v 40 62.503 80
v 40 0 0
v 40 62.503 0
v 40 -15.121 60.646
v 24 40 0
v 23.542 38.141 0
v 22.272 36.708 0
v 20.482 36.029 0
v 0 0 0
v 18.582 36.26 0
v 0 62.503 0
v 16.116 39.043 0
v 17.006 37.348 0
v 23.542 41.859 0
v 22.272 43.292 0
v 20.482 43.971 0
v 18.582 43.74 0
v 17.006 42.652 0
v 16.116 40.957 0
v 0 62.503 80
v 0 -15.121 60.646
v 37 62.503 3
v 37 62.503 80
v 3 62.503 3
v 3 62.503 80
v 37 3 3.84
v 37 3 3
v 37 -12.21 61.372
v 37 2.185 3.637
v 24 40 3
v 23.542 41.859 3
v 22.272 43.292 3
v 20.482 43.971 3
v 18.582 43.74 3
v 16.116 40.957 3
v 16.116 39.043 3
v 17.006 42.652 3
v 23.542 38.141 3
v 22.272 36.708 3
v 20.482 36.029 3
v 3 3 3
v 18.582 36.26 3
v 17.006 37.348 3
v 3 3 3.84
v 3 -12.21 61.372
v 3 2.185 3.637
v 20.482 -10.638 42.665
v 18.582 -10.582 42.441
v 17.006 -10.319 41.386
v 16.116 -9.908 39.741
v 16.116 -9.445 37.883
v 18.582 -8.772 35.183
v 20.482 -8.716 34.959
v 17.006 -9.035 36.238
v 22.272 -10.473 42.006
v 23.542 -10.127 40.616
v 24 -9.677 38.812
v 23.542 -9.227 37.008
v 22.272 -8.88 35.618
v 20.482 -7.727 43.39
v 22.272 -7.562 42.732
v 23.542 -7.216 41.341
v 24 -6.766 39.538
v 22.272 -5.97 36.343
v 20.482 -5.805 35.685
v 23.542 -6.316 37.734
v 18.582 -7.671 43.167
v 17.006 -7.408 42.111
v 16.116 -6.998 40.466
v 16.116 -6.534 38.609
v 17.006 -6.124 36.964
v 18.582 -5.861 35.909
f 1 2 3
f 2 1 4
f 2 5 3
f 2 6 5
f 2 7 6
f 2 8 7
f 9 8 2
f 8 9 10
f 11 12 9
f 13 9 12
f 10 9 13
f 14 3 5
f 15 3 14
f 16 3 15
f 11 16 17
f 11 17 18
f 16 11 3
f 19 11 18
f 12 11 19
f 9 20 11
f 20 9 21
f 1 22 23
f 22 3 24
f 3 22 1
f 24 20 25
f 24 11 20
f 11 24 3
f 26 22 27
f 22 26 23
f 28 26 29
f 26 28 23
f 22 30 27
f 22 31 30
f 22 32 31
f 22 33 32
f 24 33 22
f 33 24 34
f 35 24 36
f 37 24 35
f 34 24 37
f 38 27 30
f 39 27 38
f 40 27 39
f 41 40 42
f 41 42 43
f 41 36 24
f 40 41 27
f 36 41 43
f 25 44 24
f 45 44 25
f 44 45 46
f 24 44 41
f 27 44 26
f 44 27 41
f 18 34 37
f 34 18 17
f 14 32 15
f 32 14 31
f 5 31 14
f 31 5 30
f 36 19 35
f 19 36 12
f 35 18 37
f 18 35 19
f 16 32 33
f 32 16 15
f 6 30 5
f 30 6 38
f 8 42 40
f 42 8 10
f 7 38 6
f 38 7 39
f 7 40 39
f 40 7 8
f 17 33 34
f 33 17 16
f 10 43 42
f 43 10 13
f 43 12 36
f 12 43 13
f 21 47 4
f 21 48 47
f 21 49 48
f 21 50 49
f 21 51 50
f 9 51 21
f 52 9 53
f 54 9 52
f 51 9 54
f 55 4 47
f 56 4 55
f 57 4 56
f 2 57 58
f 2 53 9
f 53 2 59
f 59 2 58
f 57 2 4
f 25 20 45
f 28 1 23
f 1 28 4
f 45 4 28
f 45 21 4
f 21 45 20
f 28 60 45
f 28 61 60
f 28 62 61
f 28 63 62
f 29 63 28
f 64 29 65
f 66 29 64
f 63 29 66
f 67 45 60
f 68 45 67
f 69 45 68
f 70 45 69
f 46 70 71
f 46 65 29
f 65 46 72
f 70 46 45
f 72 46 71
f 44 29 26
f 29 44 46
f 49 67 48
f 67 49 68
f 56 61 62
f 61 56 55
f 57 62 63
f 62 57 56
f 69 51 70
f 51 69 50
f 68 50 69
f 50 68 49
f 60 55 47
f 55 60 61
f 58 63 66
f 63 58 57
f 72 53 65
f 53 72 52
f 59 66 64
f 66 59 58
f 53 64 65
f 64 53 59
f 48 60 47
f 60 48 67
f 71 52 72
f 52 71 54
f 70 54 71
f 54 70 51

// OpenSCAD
// F-Roof: A multi-function single-layer roof
// https://github.com/f-roof
// Author: Mihai Oltean; https://mihaioltean.github.io
//------------------------------------------------------------------------------------
// LAST UPDATE: 2025.04.08.0
//------------------------------------------------------------------------------------
module corner_60()
{
    difference(){
        cube([40, 60, 60]);
        translate([3, 3, 3])
            cube([34, 60, 60]);
        translate([20, 40, -1])
            cylinder(h = 5, r = 4);
        translate([20, -1, 40])
            rotate([-90, 0, 0])
                cylinder(h = 5, r = 4);
    }
}
//-------------------------------------------------------------
module corner_80()
{
    difference(){
        cube([40, 80, 80]);
        translate([3, 3, 3])
            cube([34, 80, 80]);
        translate([20, 40, -1])
            cylinder(h = 5, r = 4);
        translate([20, -1, 40])
            rotate([-90, 0, 0])
                cylinder(h = 5, r = 4);
    }
}
//-------------------------------------------------------------
module corner_80_half_angle(angle)
{
    length = 80 / tan(angle);
    difference(){
        cube([40, length, 80]);
        rotate([angle, 0, 0]) translate([-1, 0, 0]) cube([42, 110, 80]);
        translate([3, 3, 3])
            cube([34, length, 80]);
        translate([20, 40, -1])
            cylinder(h = 5, r = 4);
        translate([20, -1, 40])
            rotate([-90, 0, 0])
                cylinder(h = 5, r = 4);
    }
}
//-------------------------------------------------------------
module corner_80_angle(angle)
{
    corner_80_half_angle(52);
        rotate([-2*(90-angle), 0, 0 ])
        mirror([0,1,0])
            corner_80_half_angle(52);
}
//-------------------------------------------------------------
corner_80_angle(52);
//corner_80_half_angle(52);
